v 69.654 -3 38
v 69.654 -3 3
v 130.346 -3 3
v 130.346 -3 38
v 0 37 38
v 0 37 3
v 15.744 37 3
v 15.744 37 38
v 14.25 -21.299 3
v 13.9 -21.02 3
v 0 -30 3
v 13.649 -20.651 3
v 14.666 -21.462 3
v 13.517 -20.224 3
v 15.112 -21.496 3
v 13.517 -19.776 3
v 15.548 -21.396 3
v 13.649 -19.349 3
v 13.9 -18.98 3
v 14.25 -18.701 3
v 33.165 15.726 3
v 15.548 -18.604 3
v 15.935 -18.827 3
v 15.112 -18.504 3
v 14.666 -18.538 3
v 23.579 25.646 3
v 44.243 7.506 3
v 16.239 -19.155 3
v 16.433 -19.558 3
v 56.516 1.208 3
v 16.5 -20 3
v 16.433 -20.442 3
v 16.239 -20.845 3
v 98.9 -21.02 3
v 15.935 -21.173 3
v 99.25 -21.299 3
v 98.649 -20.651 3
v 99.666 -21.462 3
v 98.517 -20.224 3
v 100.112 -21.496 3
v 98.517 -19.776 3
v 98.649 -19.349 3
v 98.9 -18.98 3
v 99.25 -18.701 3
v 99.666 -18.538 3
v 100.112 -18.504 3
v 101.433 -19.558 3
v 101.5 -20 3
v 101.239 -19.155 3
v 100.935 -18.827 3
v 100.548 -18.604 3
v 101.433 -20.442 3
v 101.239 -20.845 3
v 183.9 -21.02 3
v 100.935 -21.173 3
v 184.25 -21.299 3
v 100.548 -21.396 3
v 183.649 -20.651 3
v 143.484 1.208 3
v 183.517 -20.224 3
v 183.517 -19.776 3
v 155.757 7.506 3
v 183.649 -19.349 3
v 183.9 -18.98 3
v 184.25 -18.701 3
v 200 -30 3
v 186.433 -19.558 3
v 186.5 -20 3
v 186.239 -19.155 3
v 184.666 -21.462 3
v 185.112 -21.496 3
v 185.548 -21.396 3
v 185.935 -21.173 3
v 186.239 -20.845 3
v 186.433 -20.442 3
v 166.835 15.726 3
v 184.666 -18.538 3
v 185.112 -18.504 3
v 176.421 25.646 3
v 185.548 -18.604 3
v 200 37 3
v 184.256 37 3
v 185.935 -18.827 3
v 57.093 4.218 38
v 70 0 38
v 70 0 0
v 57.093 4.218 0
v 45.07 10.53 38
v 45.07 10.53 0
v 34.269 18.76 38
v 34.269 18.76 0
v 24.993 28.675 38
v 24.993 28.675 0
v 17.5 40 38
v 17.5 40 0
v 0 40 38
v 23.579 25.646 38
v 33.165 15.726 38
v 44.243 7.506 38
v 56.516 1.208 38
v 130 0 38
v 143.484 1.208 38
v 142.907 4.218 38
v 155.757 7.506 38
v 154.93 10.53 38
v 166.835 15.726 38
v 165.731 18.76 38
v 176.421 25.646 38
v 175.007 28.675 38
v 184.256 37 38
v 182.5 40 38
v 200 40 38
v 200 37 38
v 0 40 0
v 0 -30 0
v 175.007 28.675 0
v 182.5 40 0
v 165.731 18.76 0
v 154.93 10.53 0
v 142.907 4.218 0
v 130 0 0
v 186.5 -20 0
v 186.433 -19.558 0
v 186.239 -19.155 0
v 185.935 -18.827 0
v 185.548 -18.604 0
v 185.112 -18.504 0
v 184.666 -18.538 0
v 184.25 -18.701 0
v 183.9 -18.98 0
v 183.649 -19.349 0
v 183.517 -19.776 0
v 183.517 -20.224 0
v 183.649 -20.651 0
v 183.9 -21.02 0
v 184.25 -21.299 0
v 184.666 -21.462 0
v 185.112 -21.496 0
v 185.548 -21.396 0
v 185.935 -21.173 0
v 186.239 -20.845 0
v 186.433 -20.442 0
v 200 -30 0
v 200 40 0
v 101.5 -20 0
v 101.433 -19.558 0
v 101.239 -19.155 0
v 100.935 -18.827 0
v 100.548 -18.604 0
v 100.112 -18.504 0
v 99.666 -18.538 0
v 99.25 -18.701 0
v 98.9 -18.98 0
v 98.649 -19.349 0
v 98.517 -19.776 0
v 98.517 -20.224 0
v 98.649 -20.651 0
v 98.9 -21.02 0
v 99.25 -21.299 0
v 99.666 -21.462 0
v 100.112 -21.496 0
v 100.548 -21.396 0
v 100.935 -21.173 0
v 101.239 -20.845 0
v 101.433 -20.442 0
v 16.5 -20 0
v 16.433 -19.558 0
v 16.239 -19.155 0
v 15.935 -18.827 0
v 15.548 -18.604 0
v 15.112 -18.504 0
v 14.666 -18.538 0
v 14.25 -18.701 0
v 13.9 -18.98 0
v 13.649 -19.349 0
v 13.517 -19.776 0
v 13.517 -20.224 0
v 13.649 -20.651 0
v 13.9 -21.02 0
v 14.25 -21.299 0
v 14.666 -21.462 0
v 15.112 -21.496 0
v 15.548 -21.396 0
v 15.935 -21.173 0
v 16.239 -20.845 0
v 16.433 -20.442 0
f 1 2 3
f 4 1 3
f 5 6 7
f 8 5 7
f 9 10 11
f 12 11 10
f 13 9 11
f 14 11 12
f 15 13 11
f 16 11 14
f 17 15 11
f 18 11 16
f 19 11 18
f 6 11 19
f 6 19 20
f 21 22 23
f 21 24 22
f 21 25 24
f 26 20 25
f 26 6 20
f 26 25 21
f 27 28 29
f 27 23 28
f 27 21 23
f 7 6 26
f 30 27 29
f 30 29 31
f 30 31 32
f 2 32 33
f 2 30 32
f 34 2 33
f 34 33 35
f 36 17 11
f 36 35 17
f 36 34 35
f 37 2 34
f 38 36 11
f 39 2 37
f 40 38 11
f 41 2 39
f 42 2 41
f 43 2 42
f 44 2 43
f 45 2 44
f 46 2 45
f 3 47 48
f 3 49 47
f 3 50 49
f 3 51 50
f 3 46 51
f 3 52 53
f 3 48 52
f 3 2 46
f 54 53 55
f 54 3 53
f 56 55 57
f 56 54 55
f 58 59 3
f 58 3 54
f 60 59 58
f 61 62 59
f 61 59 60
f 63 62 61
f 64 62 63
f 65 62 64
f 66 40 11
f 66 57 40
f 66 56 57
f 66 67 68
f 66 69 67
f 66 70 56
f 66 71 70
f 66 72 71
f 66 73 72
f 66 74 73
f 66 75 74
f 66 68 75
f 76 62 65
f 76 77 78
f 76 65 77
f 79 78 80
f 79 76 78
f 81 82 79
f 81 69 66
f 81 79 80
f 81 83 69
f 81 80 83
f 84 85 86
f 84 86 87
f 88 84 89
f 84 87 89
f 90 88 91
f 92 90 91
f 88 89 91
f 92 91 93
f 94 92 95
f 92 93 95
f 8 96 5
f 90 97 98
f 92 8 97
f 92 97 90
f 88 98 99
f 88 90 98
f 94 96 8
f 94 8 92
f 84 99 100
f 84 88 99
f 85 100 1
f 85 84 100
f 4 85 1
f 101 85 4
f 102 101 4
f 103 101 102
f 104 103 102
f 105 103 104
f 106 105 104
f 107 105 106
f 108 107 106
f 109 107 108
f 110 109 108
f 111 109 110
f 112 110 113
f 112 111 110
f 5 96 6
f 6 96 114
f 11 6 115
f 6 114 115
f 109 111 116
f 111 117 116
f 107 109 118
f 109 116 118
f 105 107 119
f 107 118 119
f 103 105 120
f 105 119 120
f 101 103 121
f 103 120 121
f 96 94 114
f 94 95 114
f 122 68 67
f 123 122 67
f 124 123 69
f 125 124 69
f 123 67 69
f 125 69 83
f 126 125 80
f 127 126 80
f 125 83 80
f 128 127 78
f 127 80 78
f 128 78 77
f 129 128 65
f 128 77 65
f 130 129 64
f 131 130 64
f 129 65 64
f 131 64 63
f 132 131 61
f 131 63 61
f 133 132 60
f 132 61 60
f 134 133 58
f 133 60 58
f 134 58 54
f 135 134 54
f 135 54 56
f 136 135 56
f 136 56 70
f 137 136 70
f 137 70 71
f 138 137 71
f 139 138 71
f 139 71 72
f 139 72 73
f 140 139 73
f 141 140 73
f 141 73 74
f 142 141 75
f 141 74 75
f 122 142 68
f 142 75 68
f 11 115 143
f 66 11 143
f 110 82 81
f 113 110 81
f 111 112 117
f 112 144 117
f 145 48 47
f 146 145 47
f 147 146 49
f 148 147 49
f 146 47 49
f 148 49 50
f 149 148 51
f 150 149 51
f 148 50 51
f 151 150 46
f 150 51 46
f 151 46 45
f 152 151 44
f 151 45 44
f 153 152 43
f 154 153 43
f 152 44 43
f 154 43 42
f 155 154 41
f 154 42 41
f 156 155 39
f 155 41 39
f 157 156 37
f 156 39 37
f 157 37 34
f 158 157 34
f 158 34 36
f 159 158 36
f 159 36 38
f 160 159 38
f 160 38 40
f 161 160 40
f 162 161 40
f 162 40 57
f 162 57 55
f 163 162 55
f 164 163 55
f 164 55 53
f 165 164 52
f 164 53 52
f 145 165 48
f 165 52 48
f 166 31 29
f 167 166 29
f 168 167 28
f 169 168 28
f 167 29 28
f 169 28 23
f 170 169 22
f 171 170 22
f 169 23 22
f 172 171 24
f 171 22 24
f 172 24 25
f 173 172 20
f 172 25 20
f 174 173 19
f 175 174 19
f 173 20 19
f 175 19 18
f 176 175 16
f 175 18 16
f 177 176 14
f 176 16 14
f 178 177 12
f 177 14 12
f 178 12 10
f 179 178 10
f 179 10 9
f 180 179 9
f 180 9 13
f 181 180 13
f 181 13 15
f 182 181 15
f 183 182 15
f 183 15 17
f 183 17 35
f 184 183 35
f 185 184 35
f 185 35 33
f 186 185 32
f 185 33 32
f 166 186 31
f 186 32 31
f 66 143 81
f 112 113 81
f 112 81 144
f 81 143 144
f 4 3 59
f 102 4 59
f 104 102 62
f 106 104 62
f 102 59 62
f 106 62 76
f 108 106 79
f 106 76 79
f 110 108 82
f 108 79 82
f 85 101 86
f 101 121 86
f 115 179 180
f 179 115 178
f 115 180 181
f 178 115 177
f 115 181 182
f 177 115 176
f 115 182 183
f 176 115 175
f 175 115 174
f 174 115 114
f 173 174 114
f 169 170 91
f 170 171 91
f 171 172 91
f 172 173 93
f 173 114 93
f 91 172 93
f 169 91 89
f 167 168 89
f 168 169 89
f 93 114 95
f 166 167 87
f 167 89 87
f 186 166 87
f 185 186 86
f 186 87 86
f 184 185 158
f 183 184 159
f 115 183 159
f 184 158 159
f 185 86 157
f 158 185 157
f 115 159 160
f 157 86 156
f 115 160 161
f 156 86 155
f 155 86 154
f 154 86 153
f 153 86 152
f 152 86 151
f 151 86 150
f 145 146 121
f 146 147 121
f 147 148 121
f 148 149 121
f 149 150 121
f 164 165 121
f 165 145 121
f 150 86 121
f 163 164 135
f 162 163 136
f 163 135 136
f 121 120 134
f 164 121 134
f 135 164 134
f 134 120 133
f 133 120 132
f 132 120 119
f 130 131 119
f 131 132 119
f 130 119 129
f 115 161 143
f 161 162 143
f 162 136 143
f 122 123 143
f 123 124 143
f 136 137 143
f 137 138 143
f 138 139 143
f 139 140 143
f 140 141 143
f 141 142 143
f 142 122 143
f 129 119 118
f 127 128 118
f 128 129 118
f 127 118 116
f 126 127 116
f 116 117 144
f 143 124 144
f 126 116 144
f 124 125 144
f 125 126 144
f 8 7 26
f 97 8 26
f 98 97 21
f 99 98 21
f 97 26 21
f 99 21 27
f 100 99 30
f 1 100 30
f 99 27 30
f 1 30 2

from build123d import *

# Parameters (mm, degrees)
SKETCH_1_W          = 200
SKETCH_1_H          = 30
EXTRUDE_1_DEPTH     = 3
SKETCH_2_R          = 1.5
CUT_EXTRUDE_1_DEPTH = 3
EXTRUDE_2_DEPTH     = 35


with BuildPart() as part:
    # 草图1 → 凸台-拉伸1 (new body)
    with BuildSketch(Plane.XY):
        with Locations((100, -15)):
            Rectangle(SKETCH_1_W, SKETCH_1_H)
        with BuildLine():
            Line((0, 40), (0, 0))
            Line((0, 0), (70, 0))
            ThreePointArc((70, 0), (39.497390629, 14.4184502), (17.5, 40))
            Line((17.5, 40), (0, 40))
        make_face()
        with BuildLine():
            ThreePointArc((182.5, 40), (160.502609371, 14.4184502), (130, 0))
            Line((130, 0), (200, 0))
            Line((200, 0), (200, 40))
            Line((200, 40), (182.5, 40))
        make_face()
    extrude(amount=EXTRUDE_1_DEPTH)

    # 草图2 → 切除-拉伸1 (cut)
    with BuildSketch(Plane.XY.offset(3)):
        with Locations((185, -20)):
            Circle(SKETCH_2_R)
        with Locations((100, -20)):
            Circle(SKETCH_2_R)
        with Locations((15, -20)):
            Circle(SKETCH_2_R)
    extrude(amount=-CUT_EXTRUDE_1_DEPTH, mode=Mode.SUBTRACT)

    # 草图15 → 凸台-拉伸2 (add)
    with BuildSketch(Plane.XY.offset(3)):
        with BuildLine():
            Line((69.653562136, -3), (130.346437864, -3))
            ThreePointArc((130.346437864, -3), (161.46492885, 11.388677272), (184.25647691, 37))
            Line((184.25647691, 37), (200, 37))
            Line((200, 37), (200, 40))
            Line((200, 40), (182.5, 40))
            ThreePointArc((182.5, 40), (160.502609371, 14.4184502), (130, 0))
            Line((130, 0), (70, 0))
            ThreePointArc((70, 0), (39.497390629, 14.4184502), (17.5, 40))
            Line((17.5, 40), (0, 40))
            Line((0, 40), (0, 37))
            Line((0, 37), (15.74352309, 37))
            ThreePointArc((15.74352309, 37), (38.53507115, 11.388677272), (69.653562136, -3))
        make_face()
    extrude(amount=EXTRUDE_2_DEPTH)


solid = part.part
